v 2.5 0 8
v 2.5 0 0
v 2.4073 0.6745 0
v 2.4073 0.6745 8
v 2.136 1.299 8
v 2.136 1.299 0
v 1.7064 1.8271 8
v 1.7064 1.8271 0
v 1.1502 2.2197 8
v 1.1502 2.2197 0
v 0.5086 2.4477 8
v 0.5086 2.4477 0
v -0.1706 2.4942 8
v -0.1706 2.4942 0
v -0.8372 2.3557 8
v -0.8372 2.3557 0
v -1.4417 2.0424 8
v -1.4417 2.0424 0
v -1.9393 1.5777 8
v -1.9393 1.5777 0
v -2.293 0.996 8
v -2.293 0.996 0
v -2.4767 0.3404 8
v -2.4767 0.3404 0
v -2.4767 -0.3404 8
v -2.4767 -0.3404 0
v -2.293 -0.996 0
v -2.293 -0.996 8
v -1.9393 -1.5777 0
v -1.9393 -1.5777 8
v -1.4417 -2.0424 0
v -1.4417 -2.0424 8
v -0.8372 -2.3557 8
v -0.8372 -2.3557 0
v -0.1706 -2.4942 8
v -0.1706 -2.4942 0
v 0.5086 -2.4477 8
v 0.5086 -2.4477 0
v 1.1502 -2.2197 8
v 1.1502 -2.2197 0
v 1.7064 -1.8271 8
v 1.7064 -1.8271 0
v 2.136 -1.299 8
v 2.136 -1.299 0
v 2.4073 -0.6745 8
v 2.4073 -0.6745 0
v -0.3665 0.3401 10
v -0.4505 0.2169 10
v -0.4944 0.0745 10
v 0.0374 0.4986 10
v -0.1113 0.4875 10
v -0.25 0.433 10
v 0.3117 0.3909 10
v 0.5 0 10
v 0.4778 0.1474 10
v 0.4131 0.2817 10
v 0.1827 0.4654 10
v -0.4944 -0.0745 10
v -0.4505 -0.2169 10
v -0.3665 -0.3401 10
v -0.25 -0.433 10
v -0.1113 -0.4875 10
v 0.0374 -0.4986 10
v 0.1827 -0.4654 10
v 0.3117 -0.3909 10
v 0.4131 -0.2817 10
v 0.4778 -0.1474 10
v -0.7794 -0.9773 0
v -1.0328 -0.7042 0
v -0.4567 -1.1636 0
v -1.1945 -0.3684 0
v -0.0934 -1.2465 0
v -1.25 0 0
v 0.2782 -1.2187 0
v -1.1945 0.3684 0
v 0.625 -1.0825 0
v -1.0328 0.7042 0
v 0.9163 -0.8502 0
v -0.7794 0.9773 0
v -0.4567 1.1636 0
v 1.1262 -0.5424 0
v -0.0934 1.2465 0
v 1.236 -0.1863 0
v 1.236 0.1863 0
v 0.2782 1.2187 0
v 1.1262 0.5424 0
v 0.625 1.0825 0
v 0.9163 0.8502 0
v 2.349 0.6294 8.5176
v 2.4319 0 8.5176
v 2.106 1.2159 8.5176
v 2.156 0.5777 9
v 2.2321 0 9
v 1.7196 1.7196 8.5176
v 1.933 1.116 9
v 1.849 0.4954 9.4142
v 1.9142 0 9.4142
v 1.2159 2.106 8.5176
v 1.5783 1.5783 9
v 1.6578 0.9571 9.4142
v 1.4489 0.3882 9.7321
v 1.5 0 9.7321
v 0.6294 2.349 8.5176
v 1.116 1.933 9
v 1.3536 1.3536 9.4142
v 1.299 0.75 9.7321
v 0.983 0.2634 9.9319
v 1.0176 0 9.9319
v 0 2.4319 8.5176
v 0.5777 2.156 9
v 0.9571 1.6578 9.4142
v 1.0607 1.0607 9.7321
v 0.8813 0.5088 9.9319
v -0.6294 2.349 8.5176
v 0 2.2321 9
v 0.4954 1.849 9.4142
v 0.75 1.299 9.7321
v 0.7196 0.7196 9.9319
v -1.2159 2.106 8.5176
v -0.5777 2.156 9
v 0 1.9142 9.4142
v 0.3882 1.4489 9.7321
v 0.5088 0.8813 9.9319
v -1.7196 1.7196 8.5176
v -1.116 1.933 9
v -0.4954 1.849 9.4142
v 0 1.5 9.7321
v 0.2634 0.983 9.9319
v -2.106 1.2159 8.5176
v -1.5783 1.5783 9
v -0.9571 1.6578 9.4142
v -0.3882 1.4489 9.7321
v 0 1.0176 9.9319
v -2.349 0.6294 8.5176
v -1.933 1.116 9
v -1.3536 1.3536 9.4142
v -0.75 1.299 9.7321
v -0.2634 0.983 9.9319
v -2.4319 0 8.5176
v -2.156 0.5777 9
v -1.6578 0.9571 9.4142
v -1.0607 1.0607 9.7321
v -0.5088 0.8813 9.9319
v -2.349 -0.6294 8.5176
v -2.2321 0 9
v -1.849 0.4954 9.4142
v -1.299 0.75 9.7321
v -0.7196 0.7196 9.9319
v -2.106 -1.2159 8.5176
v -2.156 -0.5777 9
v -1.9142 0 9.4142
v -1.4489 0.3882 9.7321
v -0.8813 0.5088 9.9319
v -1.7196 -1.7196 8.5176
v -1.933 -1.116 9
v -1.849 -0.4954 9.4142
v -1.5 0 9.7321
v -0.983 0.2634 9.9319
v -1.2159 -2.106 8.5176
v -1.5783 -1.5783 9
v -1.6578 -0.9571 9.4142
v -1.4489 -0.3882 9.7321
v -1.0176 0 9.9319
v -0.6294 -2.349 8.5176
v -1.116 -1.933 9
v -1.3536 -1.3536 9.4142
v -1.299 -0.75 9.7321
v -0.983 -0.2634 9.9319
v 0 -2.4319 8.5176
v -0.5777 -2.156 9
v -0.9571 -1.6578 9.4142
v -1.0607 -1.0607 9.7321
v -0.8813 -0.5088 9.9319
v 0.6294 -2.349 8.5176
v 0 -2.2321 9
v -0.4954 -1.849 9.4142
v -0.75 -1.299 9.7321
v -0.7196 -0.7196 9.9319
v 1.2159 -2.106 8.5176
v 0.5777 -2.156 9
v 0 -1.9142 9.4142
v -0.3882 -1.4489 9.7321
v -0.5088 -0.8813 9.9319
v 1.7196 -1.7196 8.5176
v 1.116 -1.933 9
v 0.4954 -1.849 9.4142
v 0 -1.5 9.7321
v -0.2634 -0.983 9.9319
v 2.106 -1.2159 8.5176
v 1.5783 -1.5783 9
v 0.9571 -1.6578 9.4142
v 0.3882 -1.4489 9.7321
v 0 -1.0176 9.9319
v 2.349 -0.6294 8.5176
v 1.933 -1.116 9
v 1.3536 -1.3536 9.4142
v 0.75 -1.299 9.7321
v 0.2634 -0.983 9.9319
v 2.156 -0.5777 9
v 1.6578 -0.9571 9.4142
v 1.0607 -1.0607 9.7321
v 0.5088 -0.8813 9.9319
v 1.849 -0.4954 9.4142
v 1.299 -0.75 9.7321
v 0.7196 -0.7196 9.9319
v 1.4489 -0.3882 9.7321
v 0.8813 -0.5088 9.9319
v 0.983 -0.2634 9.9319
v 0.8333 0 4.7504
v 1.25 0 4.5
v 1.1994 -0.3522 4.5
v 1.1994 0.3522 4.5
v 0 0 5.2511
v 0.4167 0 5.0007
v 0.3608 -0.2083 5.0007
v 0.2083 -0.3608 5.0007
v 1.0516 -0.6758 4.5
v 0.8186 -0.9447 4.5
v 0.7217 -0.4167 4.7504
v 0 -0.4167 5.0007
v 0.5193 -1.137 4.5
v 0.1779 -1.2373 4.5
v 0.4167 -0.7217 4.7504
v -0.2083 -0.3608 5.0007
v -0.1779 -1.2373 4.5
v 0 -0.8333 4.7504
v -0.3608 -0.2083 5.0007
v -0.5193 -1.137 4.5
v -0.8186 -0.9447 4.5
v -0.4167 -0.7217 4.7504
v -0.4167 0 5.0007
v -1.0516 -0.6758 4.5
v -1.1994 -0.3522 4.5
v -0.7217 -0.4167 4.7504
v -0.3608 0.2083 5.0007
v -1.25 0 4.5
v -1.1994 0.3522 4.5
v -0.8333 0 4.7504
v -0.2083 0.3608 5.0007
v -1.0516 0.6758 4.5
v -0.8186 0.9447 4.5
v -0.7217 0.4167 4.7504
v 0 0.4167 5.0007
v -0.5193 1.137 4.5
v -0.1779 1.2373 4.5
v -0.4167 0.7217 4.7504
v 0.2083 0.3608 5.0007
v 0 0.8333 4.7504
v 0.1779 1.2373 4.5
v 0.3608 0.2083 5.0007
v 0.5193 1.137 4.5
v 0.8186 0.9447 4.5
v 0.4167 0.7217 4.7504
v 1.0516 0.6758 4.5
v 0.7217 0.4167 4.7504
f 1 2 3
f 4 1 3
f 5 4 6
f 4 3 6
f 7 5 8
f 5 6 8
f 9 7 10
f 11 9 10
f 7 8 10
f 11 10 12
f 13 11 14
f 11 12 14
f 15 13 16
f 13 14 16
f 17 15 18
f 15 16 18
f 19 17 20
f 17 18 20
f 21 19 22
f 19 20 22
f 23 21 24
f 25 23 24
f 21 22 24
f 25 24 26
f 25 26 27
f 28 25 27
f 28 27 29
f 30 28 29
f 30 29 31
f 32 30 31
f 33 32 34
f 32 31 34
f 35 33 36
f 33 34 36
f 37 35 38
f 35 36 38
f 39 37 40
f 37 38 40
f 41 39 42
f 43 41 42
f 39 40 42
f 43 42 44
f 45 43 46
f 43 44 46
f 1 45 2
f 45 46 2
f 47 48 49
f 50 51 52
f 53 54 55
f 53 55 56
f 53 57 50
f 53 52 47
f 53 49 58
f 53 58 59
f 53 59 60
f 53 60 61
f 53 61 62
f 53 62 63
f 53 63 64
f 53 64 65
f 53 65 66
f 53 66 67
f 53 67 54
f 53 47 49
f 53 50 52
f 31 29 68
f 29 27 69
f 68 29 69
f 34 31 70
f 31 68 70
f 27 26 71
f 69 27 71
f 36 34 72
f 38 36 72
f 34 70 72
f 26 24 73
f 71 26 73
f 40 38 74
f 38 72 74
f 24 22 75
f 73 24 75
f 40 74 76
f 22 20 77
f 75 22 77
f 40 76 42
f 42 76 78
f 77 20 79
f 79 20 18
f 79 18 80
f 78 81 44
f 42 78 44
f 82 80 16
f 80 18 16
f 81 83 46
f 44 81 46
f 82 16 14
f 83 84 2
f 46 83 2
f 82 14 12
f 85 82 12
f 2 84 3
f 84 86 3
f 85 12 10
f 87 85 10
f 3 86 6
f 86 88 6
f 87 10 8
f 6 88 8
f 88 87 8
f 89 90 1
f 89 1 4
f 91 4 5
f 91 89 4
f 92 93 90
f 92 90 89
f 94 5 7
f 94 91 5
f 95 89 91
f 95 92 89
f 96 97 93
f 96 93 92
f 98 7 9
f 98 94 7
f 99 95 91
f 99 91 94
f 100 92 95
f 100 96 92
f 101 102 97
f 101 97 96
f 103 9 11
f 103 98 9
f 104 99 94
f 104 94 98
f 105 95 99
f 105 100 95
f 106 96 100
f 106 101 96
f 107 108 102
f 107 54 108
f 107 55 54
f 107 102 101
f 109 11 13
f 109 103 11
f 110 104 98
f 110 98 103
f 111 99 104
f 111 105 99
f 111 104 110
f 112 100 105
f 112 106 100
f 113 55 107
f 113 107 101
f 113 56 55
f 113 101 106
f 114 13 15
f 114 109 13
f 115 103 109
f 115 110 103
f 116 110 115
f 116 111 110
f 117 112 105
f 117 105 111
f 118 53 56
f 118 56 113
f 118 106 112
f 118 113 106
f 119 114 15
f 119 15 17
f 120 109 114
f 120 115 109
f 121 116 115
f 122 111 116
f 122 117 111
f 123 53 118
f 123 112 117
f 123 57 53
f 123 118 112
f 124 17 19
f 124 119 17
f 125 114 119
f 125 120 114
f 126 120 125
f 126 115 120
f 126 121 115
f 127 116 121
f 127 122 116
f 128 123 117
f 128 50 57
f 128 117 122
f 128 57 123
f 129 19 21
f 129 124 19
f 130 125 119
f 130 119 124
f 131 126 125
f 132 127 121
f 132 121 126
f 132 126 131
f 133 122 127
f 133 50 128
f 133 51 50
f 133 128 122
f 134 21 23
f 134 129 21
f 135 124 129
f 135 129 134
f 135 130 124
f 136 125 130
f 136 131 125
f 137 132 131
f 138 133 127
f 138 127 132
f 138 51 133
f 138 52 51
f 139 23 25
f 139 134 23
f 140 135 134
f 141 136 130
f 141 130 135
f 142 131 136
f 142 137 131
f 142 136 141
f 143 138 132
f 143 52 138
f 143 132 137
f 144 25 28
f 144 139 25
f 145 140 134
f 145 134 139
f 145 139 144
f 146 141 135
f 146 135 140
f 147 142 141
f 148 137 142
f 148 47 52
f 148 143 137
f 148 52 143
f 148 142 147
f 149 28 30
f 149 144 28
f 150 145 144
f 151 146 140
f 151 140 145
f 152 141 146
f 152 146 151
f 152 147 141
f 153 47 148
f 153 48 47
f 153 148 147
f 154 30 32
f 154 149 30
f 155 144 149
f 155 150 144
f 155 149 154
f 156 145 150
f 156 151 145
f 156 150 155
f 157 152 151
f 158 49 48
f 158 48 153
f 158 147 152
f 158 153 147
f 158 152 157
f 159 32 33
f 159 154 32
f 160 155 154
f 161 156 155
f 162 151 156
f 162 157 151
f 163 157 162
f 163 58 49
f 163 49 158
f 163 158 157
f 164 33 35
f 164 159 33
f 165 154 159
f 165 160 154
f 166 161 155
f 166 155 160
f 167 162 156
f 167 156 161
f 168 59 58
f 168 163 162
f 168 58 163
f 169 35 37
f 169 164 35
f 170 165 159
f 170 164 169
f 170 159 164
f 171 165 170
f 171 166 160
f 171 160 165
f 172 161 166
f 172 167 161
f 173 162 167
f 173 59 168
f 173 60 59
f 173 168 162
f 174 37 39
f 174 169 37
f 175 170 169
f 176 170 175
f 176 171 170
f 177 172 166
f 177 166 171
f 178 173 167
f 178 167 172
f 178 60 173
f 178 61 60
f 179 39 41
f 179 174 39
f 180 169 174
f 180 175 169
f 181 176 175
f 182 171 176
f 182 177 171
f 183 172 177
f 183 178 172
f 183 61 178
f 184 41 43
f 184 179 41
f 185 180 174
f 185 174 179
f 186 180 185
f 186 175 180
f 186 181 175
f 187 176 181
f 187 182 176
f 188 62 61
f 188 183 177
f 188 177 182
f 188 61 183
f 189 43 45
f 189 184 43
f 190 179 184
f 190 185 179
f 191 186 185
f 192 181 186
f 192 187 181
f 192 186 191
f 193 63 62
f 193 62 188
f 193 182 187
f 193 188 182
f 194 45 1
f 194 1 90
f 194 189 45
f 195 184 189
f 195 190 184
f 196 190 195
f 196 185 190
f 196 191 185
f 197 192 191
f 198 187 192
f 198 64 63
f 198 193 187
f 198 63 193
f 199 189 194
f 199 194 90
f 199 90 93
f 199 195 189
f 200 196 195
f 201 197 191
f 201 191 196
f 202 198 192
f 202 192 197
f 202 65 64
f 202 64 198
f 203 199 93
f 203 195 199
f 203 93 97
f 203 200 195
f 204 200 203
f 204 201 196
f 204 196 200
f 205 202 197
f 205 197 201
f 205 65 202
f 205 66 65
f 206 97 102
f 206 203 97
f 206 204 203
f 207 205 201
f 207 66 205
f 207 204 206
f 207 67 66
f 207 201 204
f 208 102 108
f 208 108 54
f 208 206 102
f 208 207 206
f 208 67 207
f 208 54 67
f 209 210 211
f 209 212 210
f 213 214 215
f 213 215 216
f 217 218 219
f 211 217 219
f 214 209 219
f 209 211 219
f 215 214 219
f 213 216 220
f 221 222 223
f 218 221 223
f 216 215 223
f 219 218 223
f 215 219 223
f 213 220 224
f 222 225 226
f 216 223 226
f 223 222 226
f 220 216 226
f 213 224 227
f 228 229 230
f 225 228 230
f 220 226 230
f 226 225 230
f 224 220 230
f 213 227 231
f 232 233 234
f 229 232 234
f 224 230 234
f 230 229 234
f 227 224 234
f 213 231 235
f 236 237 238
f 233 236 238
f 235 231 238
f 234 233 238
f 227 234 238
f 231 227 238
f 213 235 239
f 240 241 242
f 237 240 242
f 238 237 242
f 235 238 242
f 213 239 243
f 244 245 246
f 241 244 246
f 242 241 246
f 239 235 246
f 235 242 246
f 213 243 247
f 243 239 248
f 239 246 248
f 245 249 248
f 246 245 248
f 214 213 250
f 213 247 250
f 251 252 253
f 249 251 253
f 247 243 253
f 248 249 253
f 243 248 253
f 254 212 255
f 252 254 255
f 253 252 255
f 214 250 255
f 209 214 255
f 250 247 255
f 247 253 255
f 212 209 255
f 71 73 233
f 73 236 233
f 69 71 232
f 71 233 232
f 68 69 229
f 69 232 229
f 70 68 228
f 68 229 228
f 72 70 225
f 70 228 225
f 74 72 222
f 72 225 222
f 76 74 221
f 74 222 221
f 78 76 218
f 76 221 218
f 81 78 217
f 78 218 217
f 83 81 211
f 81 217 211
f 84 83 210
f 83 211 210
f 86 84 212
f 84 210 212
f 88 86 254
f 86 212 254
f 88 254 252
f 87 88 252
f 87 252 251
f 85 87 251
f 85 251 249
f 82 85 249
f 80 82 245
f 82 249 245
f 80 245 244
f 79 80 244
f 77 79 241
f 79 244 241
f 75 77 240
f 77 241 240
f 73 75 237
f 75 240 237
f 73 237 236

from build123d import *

# Parameters (mm, degrees)
F0_R     = 2.5
F0_R_2   = 1.25
F1_DEPTH = 10
F2_R     = 2
F4_D     = 2.5
F4_DEPTH = 4.5
F4_TIP   = 0.7510757738


with BuildPart() as f1:
    # F0 (on Top) → F1 (new body)
    with BuildSketch(Plane.XY):
        Circle(F0_R)
        Circle(F0_R_2, mode=Mode.SUBTRACT)
        Circle(F0_R_2)
    extrude(amount=F1_DEPTH)

    # F2
    f2_edges = [f1.edges().sort_by_distance(p)[0] for p in [
        (-2.5, 0, 10),
    ]]
    fillet(f2_edges, radius=F2_R)

    # F4
    with Locations(Plane(origin=(0, 0, 0), x_dir=(1, 0, 0), z_dir=(0, 0, -1))):
        with Locations((0, 0)):
            Hole(F4_D / 2, depth=F4_DEPTH)
            with Locations((0, 0, -(F4_DEPTH + F4_TIP / 2))):  # 118° drill point
                Cone(0, F4_D / 2, F4_TIP, mode=Mode.SUBTRACT)


solid = f1.part
